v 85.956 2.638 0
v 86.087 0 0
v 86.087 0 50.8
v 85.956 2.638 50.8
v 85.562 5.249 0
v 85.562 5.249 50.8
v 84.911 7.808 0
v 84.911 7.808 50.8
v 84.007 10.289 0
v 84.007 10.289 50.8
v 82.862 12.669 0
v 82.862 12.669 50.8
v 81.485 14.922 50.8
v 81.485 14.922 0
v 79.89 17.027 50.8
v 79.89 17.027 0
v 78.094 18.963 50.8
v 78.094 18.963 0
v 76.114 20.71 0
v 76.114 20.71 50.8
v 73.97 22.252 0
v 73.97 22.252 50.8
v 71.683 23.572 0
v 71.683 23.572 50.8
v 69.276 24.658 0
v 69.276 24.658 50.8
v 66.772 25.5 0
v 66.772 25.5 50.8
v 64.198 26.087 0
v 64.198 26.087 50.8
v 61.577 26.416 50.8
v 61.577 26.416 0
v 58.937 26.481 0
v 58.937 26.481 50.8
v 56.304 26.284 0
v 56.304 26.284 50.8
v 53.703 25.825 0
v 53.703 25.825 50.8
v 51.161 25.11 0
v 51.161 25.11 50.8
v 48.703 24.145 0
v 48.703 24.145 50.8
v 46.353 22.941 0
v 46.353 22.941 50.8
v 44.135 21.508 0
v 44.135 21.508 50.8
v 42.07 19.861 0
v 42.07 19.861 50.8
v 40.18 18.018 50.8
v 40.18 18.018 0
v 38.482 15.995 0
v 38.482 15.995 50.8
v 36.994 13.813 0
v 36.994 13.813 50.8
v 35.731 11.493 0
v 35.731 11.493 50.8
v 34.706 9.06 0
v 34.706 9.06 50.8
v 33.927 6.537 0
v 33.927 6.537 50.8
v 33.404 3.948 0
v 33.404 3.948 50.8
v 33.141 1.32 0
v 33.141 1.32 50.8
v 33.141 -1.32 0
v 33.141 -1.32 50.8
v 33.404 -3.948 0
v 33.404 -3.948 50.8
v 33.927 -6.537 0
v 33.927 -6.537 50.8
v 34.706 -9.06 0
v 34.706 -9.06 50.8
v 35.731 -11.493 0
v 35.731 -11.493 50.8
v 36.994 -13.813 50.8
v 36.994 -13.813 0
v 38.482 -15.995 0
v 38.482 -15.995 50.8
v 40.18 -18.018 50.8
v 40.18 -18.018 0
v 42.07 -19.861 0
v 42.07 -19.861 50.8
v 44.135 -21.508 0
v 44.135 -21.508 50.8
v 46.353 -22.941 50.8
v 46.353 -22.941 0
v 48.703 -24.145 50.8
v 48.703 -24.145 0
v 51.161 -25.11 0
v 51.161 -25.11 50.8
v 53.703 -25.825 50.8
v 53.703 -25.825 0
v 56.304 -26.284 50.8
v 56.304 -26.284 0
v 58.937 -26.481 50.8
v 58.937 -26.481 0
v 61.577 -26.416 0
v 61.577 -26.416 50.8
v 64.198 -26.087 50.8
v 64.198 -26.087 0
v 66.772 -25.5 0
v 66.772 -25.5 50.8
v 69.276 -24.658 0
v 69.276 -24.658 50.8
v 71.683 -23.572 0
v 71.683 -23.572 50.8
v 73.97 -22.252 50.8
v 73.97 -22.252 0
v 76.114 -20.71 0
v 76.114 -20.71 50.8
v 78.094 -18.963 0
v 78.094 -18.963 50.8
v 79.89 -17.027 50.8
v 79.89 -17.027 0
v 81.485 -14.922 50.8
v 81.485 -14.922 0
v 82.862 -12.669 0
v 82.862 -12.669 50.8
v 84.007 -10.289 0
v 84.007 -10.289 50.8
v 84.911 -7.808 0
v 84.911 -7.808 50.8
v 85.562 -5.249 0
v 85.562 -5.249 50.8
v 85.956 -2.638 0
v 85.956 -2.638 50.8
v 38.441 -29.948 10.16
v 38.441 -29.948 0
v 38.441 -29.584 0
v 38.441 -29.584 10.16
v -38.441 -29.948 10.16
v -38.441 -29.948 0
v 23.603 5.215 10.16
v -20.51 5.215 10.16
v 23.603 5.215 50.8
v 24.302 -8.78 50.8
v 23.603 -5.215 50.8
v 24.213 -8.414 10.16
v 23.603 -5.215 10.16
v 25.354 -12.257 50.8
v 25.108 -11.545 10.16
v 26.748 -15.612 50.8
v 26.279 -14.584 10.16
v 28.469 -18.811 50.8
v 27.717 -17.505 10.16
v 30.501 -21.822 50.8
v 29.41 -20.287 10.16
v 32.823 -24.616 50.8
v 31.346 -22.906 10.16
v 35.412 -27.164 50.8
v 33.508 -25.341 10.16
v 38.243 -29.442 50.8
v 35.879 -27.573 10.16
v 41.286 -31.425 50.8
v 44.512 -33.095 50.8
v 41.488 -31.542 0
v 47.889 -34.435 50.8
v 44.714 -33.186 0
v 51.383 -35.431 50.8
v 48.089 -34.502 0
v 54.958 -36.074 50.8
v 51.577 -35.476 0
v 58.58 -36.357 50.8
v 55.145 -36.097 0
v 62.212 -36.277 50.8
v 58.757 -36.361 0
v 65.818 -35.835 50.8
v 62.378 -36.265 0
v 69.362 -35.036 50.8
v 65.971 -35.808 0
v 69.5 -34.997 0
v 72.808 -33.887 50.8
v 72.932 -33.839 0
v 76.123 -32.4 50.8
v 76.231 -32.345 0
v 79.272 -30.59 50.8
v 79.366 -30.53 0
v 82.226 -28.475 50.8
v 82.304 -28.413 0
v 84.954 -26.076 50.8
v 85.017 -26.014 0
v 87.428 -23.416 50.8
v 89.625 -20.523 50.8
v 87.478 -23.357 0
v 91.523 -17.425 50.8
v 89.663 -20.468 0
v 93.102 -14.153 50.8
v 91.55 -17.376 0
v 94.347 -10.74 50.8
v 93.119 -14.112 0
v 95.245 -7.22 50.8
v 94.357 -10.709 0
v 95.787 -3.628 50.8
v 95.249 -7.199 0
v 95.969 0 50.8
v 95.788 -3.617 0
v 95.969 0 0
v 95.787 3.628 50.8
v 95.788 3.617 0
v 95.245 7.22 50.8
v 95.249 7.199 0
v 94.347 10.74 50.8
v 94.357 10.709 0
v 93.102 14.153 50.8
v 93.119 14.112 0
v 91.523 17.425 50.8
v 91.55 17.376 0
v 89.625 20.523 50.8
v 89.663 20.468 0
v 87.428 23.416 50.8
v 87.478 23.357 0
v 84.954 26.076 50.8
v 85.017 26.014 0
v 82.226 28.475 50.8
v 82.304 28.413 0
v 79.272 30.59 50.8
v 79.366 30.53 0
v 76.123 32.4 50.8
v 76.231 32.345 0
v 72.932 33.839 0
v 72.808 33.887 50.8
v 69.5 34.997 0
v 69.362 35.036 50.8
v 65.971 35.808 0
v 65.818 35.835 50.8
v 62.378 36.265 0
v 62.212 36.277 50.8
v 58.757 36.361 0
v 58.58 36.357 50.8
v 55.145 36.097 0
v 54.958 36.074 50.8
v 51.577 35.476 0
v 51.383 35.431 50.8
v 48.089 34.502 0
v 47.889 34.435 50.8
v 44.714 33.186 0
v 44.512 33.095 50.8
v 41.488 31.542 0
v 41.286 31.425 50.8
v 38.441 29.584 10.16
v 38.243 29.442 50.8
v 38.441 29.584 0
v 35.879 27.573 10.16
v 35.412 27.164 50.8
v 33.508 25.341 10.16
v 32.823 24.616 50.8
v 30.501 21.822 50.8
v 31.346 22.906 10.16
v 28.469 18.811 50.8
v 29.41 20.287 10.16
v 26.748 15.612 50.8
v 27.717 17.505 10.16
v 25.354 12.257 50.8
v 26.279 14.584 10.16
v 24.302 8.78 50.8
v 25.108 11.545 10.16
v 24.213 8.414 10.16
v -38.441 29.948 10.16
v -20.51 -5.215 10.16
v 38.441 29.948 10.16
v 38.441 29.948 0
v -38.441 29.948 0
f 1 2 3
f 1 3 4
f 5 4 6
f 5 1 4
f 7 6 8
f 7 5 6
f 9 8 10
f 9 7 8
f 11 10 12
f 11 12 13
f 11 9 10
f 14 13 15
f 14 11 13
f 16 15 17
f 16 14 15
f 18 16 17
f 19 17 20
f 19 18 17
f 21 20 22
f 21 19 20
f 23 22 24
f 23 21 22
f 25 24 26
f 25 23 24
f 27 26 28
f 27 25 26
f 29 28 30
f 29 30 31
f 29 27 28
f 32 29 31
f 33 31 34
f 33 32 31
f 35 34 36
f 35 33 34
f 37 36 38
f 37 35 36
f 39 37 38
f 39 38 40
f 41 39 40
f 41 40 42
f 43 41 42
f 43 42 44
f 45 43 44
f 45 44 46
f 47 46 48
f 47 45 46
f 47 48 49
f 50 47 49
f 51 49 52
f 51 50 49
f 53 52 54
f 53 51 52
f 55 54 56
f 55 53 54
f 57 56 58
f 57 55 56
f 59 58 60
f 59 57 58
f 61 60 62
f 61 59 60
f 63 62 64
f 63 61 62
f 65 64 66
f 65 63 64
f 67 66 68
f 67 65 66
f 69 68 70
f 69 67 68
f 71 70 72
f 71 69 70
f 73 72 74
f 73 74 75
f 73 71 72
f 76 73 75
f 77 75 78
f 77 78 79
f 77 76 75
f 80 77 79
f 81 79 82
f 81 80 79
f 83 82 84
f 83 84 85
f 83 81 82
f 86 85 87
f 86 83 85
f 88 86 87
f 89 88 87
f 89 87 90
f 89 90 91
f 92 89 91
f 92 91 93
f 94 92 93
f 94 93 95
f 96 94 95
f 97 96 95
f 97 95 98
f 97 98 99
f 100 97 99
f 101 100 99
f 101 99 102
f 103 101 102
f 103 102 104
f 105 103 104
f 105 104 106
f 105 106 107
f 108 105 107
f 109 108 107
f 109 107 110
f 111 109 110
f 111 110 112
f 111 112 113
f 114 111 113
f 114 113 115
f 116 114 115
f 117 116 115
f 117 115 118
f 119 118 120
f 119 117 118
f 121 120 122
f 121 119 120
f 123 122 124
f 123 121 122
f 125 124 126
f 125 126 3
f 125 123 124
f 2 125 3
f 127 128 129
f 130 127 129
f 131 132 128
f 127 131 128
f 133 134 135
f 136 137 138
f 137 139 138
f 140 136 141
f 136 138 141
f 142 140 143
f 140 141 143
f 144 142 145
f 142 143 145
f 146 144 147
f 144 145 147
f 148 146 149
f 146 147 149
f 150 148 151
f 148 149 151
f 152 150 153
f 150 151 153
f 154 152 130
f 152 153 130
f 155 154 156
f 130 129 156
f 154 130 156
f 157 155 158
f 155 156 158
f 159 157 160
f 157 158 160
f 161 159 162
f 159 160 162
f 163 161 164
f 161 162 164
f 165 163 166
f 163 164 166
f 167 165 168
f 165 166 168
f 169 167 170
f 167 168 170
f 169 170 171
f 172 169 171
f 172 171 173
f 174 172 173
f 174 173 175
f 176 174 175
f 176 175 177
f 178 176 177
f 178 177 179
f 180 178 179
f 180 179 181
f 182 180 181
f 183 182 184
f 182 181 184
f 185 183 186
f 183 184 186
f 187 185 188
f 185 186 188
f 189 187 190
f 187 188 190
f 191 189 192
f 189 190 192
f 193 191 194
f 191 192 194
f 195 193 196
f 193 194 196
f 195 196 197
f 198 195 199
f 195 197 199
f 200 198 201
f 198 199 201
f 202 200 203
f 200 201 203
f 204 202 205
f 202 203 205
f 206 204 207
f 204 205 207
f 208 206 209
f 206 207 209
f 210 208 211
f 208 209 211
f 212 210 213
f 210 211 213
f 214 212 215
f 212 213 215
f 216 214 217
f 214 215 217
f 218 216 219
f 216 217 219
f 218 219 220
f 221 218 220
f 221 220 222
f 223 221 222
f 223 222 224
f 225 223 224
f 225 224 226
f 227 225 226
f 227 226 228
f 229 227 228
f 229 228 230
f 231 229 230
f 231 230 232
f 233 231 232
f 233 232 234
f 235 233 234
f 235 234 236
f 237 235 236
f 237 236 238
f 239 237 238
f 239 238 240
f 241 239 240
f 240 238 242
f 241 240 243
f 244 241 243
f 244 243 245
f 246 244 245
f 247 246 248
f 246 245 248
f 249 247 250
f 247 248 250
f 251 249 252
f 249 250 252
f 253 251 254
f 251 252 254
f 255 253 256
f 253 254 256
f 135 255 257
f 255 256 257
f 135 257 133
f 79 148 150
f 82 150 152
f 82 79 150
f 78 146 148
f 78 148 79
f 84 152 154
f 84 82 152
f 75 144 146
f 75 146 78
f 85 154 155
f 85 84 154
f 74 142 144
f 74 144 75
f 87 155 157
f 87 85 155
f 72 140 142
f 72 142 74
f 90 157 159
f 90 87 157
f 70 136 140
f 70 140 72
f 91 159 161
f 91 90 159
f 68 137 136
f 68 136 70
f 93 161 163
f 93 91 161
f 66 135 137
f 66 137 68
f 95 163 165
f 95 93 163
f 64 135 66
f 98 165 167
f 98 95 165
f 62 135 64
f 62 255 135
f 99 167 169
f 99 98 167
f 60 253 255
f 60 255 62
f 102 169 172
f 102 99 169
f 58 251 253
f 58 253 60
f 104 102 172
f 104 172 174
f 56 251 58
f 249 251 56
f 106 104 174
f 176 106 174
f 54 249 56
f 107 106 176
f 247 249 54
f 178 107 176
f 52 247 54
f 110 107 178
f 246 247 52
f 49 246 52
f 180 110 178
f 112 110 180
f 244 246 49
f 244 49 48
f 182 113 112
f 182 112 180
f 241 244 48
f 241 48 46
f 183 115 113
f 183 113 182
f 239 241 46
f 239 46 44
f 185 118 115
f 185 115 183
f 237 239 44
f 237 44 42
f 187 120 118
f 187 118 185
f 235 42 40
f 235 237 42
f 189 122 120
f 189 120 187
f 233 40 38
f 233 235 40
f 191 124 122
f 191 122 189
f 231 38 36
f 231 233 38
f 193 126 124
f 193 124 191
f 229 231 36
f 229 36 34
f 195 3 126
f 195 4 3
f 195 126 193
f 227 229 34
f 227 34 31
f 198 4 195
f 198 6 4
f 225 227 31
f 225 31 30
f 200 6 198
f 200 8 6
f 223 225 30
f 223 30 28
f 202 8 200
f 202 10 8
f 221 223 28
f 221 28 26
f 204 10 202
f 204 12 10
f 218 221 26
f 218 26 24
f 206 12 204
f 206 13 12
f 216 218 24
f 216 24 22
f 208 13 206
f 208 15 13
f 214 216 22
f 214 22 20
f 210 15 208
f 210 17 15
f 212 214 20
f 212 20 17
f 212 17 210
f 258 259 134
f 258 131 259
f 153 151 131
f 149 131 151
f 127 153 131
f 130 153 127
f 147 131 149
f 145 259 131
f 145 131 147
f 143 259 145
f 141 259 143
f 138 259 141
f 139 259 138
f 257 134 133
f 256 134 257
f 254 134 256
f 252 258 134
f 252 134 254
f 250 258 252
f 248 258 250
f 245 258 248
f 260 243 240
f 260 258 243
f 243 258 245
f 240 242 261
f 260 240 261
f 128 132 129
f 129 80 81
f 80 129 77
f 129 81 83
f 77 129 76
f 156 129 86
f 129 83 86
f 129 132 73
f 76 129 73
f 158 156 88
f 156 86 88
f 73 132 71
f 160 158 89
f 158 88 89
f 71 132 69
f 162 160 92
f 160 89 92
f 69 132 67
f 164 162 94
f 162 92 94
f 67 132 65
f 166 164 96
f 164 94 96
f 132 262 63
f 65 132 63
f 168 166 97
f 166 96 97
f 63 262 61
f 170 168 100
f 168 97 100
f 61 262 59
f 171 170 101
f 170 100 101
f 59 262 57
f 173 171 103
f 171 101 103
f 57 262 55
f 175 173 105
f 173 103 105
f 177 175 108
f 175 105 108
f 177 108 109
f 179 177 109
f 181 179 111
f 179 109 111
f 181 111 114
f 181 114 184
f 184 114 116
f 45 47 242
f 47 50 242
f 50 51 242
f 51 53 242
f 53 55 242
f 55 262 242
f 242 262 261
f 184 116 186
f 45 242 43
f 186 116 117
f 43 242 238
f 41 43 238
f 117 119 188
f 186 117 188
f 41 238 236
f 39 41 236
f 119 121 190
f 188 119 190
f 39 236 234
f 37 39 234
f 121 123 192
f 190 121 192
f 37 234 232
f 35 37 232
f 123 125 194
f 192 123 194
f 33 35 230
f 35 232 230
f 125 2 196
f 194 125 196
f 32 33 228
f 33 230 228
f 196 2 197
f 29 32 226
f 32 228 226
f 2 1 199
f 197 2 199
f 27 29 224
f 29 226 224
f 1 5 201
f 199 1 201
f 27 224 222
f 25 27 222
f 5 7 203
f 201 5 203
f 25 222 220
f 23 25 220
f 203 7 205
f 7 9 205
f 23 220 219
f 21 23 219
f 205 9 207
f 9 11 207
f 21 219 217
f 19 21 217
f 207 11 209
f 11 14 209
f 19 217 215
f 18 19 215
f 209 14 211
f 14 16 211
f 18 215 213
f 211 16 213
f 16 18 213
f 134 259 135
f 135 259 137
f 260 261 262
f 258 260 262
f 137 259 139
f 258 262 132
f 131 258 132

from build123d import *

# Parameters (mm, degrees)
F1_DEPTH = 10.16
F0_R     = 26.4895980544
F2_DEPTH = 50.8
F3_W     = 45.2943015844
F3_H     = 10.4296095669
F4_DEPTH = 40.64
F6_DEPTH = 41.5868318139


with BuildPart() as f1:
    # F0 (on Top) → F1 (new body)
    with BuildSketch(Plane.XY):
        with BuildLine():
            Line((-38.4405590594, 29.9478769302), (-38.4405590594, -29.9478769302))
            Line((-38.4405590594, -29.9478769302), (38.4405590594, -29.9478769302))
            Line((38.4405590594, -29.9478769302), (38.4405590594, -29.5841870222))
            ThreePointArc((38.4405590594, -29.5841870222), (23.2267408591, 0), (38.4405590594, 29.5841870222))
            Line((38.4405590594, 29.5841870222), (38.4405590594, 29.9478769302))
            Line((38.4405590594, 29.9478769302), (-38.4405590594, 29.9478769302))
        make_face()
    extrude(amount=F1_DEPTH)

    # F0 (on Top) → F2 (join)
    with BuildSketch(Plane.XY):
        with BuildLine():
            ThreePointArc((38.4405590594, 29.5841870222), (23.2267408591, 0), (38.4405590594, -29.5841870222))
            ThreePointArc((38.4405590594, -29.5841870222), (76.2312009837, -32.3447137991), (95.9687949199, 0))
            ThreePointArc((95.9687949199, 0), (76.2312009837, 32.3447137991), (38.4405590594, 29.5841870222))
        make_face()
        with Locations((59.5977678895, 0)):
            Circle(F0_R, mode=Mode.SUBTRACT)
    extrude(amount=F2_DEPTH)

    # F3 (on face) → F4 (join)
    with BuildSketch(Plane.XY.offset(10.16)):
        with Locations((2.1366886795, 0)):
            Rectangle(F3_W, F3_H)
    extrude(amount=F4_DEPTH)

    # F5 (on face) → F6 (cut, through all)
    with BuildSketch(Plane.XZ.offset(5.2148047835)):
        Polygon((-20.5104621127, 50.8), (-20.5104621127, 10.16), (23.6025262829, 50.8), align=None)
    extrude(amount=-F6_DEPTH, mode=Mode.SUBTRACT)


solid = f1.part
